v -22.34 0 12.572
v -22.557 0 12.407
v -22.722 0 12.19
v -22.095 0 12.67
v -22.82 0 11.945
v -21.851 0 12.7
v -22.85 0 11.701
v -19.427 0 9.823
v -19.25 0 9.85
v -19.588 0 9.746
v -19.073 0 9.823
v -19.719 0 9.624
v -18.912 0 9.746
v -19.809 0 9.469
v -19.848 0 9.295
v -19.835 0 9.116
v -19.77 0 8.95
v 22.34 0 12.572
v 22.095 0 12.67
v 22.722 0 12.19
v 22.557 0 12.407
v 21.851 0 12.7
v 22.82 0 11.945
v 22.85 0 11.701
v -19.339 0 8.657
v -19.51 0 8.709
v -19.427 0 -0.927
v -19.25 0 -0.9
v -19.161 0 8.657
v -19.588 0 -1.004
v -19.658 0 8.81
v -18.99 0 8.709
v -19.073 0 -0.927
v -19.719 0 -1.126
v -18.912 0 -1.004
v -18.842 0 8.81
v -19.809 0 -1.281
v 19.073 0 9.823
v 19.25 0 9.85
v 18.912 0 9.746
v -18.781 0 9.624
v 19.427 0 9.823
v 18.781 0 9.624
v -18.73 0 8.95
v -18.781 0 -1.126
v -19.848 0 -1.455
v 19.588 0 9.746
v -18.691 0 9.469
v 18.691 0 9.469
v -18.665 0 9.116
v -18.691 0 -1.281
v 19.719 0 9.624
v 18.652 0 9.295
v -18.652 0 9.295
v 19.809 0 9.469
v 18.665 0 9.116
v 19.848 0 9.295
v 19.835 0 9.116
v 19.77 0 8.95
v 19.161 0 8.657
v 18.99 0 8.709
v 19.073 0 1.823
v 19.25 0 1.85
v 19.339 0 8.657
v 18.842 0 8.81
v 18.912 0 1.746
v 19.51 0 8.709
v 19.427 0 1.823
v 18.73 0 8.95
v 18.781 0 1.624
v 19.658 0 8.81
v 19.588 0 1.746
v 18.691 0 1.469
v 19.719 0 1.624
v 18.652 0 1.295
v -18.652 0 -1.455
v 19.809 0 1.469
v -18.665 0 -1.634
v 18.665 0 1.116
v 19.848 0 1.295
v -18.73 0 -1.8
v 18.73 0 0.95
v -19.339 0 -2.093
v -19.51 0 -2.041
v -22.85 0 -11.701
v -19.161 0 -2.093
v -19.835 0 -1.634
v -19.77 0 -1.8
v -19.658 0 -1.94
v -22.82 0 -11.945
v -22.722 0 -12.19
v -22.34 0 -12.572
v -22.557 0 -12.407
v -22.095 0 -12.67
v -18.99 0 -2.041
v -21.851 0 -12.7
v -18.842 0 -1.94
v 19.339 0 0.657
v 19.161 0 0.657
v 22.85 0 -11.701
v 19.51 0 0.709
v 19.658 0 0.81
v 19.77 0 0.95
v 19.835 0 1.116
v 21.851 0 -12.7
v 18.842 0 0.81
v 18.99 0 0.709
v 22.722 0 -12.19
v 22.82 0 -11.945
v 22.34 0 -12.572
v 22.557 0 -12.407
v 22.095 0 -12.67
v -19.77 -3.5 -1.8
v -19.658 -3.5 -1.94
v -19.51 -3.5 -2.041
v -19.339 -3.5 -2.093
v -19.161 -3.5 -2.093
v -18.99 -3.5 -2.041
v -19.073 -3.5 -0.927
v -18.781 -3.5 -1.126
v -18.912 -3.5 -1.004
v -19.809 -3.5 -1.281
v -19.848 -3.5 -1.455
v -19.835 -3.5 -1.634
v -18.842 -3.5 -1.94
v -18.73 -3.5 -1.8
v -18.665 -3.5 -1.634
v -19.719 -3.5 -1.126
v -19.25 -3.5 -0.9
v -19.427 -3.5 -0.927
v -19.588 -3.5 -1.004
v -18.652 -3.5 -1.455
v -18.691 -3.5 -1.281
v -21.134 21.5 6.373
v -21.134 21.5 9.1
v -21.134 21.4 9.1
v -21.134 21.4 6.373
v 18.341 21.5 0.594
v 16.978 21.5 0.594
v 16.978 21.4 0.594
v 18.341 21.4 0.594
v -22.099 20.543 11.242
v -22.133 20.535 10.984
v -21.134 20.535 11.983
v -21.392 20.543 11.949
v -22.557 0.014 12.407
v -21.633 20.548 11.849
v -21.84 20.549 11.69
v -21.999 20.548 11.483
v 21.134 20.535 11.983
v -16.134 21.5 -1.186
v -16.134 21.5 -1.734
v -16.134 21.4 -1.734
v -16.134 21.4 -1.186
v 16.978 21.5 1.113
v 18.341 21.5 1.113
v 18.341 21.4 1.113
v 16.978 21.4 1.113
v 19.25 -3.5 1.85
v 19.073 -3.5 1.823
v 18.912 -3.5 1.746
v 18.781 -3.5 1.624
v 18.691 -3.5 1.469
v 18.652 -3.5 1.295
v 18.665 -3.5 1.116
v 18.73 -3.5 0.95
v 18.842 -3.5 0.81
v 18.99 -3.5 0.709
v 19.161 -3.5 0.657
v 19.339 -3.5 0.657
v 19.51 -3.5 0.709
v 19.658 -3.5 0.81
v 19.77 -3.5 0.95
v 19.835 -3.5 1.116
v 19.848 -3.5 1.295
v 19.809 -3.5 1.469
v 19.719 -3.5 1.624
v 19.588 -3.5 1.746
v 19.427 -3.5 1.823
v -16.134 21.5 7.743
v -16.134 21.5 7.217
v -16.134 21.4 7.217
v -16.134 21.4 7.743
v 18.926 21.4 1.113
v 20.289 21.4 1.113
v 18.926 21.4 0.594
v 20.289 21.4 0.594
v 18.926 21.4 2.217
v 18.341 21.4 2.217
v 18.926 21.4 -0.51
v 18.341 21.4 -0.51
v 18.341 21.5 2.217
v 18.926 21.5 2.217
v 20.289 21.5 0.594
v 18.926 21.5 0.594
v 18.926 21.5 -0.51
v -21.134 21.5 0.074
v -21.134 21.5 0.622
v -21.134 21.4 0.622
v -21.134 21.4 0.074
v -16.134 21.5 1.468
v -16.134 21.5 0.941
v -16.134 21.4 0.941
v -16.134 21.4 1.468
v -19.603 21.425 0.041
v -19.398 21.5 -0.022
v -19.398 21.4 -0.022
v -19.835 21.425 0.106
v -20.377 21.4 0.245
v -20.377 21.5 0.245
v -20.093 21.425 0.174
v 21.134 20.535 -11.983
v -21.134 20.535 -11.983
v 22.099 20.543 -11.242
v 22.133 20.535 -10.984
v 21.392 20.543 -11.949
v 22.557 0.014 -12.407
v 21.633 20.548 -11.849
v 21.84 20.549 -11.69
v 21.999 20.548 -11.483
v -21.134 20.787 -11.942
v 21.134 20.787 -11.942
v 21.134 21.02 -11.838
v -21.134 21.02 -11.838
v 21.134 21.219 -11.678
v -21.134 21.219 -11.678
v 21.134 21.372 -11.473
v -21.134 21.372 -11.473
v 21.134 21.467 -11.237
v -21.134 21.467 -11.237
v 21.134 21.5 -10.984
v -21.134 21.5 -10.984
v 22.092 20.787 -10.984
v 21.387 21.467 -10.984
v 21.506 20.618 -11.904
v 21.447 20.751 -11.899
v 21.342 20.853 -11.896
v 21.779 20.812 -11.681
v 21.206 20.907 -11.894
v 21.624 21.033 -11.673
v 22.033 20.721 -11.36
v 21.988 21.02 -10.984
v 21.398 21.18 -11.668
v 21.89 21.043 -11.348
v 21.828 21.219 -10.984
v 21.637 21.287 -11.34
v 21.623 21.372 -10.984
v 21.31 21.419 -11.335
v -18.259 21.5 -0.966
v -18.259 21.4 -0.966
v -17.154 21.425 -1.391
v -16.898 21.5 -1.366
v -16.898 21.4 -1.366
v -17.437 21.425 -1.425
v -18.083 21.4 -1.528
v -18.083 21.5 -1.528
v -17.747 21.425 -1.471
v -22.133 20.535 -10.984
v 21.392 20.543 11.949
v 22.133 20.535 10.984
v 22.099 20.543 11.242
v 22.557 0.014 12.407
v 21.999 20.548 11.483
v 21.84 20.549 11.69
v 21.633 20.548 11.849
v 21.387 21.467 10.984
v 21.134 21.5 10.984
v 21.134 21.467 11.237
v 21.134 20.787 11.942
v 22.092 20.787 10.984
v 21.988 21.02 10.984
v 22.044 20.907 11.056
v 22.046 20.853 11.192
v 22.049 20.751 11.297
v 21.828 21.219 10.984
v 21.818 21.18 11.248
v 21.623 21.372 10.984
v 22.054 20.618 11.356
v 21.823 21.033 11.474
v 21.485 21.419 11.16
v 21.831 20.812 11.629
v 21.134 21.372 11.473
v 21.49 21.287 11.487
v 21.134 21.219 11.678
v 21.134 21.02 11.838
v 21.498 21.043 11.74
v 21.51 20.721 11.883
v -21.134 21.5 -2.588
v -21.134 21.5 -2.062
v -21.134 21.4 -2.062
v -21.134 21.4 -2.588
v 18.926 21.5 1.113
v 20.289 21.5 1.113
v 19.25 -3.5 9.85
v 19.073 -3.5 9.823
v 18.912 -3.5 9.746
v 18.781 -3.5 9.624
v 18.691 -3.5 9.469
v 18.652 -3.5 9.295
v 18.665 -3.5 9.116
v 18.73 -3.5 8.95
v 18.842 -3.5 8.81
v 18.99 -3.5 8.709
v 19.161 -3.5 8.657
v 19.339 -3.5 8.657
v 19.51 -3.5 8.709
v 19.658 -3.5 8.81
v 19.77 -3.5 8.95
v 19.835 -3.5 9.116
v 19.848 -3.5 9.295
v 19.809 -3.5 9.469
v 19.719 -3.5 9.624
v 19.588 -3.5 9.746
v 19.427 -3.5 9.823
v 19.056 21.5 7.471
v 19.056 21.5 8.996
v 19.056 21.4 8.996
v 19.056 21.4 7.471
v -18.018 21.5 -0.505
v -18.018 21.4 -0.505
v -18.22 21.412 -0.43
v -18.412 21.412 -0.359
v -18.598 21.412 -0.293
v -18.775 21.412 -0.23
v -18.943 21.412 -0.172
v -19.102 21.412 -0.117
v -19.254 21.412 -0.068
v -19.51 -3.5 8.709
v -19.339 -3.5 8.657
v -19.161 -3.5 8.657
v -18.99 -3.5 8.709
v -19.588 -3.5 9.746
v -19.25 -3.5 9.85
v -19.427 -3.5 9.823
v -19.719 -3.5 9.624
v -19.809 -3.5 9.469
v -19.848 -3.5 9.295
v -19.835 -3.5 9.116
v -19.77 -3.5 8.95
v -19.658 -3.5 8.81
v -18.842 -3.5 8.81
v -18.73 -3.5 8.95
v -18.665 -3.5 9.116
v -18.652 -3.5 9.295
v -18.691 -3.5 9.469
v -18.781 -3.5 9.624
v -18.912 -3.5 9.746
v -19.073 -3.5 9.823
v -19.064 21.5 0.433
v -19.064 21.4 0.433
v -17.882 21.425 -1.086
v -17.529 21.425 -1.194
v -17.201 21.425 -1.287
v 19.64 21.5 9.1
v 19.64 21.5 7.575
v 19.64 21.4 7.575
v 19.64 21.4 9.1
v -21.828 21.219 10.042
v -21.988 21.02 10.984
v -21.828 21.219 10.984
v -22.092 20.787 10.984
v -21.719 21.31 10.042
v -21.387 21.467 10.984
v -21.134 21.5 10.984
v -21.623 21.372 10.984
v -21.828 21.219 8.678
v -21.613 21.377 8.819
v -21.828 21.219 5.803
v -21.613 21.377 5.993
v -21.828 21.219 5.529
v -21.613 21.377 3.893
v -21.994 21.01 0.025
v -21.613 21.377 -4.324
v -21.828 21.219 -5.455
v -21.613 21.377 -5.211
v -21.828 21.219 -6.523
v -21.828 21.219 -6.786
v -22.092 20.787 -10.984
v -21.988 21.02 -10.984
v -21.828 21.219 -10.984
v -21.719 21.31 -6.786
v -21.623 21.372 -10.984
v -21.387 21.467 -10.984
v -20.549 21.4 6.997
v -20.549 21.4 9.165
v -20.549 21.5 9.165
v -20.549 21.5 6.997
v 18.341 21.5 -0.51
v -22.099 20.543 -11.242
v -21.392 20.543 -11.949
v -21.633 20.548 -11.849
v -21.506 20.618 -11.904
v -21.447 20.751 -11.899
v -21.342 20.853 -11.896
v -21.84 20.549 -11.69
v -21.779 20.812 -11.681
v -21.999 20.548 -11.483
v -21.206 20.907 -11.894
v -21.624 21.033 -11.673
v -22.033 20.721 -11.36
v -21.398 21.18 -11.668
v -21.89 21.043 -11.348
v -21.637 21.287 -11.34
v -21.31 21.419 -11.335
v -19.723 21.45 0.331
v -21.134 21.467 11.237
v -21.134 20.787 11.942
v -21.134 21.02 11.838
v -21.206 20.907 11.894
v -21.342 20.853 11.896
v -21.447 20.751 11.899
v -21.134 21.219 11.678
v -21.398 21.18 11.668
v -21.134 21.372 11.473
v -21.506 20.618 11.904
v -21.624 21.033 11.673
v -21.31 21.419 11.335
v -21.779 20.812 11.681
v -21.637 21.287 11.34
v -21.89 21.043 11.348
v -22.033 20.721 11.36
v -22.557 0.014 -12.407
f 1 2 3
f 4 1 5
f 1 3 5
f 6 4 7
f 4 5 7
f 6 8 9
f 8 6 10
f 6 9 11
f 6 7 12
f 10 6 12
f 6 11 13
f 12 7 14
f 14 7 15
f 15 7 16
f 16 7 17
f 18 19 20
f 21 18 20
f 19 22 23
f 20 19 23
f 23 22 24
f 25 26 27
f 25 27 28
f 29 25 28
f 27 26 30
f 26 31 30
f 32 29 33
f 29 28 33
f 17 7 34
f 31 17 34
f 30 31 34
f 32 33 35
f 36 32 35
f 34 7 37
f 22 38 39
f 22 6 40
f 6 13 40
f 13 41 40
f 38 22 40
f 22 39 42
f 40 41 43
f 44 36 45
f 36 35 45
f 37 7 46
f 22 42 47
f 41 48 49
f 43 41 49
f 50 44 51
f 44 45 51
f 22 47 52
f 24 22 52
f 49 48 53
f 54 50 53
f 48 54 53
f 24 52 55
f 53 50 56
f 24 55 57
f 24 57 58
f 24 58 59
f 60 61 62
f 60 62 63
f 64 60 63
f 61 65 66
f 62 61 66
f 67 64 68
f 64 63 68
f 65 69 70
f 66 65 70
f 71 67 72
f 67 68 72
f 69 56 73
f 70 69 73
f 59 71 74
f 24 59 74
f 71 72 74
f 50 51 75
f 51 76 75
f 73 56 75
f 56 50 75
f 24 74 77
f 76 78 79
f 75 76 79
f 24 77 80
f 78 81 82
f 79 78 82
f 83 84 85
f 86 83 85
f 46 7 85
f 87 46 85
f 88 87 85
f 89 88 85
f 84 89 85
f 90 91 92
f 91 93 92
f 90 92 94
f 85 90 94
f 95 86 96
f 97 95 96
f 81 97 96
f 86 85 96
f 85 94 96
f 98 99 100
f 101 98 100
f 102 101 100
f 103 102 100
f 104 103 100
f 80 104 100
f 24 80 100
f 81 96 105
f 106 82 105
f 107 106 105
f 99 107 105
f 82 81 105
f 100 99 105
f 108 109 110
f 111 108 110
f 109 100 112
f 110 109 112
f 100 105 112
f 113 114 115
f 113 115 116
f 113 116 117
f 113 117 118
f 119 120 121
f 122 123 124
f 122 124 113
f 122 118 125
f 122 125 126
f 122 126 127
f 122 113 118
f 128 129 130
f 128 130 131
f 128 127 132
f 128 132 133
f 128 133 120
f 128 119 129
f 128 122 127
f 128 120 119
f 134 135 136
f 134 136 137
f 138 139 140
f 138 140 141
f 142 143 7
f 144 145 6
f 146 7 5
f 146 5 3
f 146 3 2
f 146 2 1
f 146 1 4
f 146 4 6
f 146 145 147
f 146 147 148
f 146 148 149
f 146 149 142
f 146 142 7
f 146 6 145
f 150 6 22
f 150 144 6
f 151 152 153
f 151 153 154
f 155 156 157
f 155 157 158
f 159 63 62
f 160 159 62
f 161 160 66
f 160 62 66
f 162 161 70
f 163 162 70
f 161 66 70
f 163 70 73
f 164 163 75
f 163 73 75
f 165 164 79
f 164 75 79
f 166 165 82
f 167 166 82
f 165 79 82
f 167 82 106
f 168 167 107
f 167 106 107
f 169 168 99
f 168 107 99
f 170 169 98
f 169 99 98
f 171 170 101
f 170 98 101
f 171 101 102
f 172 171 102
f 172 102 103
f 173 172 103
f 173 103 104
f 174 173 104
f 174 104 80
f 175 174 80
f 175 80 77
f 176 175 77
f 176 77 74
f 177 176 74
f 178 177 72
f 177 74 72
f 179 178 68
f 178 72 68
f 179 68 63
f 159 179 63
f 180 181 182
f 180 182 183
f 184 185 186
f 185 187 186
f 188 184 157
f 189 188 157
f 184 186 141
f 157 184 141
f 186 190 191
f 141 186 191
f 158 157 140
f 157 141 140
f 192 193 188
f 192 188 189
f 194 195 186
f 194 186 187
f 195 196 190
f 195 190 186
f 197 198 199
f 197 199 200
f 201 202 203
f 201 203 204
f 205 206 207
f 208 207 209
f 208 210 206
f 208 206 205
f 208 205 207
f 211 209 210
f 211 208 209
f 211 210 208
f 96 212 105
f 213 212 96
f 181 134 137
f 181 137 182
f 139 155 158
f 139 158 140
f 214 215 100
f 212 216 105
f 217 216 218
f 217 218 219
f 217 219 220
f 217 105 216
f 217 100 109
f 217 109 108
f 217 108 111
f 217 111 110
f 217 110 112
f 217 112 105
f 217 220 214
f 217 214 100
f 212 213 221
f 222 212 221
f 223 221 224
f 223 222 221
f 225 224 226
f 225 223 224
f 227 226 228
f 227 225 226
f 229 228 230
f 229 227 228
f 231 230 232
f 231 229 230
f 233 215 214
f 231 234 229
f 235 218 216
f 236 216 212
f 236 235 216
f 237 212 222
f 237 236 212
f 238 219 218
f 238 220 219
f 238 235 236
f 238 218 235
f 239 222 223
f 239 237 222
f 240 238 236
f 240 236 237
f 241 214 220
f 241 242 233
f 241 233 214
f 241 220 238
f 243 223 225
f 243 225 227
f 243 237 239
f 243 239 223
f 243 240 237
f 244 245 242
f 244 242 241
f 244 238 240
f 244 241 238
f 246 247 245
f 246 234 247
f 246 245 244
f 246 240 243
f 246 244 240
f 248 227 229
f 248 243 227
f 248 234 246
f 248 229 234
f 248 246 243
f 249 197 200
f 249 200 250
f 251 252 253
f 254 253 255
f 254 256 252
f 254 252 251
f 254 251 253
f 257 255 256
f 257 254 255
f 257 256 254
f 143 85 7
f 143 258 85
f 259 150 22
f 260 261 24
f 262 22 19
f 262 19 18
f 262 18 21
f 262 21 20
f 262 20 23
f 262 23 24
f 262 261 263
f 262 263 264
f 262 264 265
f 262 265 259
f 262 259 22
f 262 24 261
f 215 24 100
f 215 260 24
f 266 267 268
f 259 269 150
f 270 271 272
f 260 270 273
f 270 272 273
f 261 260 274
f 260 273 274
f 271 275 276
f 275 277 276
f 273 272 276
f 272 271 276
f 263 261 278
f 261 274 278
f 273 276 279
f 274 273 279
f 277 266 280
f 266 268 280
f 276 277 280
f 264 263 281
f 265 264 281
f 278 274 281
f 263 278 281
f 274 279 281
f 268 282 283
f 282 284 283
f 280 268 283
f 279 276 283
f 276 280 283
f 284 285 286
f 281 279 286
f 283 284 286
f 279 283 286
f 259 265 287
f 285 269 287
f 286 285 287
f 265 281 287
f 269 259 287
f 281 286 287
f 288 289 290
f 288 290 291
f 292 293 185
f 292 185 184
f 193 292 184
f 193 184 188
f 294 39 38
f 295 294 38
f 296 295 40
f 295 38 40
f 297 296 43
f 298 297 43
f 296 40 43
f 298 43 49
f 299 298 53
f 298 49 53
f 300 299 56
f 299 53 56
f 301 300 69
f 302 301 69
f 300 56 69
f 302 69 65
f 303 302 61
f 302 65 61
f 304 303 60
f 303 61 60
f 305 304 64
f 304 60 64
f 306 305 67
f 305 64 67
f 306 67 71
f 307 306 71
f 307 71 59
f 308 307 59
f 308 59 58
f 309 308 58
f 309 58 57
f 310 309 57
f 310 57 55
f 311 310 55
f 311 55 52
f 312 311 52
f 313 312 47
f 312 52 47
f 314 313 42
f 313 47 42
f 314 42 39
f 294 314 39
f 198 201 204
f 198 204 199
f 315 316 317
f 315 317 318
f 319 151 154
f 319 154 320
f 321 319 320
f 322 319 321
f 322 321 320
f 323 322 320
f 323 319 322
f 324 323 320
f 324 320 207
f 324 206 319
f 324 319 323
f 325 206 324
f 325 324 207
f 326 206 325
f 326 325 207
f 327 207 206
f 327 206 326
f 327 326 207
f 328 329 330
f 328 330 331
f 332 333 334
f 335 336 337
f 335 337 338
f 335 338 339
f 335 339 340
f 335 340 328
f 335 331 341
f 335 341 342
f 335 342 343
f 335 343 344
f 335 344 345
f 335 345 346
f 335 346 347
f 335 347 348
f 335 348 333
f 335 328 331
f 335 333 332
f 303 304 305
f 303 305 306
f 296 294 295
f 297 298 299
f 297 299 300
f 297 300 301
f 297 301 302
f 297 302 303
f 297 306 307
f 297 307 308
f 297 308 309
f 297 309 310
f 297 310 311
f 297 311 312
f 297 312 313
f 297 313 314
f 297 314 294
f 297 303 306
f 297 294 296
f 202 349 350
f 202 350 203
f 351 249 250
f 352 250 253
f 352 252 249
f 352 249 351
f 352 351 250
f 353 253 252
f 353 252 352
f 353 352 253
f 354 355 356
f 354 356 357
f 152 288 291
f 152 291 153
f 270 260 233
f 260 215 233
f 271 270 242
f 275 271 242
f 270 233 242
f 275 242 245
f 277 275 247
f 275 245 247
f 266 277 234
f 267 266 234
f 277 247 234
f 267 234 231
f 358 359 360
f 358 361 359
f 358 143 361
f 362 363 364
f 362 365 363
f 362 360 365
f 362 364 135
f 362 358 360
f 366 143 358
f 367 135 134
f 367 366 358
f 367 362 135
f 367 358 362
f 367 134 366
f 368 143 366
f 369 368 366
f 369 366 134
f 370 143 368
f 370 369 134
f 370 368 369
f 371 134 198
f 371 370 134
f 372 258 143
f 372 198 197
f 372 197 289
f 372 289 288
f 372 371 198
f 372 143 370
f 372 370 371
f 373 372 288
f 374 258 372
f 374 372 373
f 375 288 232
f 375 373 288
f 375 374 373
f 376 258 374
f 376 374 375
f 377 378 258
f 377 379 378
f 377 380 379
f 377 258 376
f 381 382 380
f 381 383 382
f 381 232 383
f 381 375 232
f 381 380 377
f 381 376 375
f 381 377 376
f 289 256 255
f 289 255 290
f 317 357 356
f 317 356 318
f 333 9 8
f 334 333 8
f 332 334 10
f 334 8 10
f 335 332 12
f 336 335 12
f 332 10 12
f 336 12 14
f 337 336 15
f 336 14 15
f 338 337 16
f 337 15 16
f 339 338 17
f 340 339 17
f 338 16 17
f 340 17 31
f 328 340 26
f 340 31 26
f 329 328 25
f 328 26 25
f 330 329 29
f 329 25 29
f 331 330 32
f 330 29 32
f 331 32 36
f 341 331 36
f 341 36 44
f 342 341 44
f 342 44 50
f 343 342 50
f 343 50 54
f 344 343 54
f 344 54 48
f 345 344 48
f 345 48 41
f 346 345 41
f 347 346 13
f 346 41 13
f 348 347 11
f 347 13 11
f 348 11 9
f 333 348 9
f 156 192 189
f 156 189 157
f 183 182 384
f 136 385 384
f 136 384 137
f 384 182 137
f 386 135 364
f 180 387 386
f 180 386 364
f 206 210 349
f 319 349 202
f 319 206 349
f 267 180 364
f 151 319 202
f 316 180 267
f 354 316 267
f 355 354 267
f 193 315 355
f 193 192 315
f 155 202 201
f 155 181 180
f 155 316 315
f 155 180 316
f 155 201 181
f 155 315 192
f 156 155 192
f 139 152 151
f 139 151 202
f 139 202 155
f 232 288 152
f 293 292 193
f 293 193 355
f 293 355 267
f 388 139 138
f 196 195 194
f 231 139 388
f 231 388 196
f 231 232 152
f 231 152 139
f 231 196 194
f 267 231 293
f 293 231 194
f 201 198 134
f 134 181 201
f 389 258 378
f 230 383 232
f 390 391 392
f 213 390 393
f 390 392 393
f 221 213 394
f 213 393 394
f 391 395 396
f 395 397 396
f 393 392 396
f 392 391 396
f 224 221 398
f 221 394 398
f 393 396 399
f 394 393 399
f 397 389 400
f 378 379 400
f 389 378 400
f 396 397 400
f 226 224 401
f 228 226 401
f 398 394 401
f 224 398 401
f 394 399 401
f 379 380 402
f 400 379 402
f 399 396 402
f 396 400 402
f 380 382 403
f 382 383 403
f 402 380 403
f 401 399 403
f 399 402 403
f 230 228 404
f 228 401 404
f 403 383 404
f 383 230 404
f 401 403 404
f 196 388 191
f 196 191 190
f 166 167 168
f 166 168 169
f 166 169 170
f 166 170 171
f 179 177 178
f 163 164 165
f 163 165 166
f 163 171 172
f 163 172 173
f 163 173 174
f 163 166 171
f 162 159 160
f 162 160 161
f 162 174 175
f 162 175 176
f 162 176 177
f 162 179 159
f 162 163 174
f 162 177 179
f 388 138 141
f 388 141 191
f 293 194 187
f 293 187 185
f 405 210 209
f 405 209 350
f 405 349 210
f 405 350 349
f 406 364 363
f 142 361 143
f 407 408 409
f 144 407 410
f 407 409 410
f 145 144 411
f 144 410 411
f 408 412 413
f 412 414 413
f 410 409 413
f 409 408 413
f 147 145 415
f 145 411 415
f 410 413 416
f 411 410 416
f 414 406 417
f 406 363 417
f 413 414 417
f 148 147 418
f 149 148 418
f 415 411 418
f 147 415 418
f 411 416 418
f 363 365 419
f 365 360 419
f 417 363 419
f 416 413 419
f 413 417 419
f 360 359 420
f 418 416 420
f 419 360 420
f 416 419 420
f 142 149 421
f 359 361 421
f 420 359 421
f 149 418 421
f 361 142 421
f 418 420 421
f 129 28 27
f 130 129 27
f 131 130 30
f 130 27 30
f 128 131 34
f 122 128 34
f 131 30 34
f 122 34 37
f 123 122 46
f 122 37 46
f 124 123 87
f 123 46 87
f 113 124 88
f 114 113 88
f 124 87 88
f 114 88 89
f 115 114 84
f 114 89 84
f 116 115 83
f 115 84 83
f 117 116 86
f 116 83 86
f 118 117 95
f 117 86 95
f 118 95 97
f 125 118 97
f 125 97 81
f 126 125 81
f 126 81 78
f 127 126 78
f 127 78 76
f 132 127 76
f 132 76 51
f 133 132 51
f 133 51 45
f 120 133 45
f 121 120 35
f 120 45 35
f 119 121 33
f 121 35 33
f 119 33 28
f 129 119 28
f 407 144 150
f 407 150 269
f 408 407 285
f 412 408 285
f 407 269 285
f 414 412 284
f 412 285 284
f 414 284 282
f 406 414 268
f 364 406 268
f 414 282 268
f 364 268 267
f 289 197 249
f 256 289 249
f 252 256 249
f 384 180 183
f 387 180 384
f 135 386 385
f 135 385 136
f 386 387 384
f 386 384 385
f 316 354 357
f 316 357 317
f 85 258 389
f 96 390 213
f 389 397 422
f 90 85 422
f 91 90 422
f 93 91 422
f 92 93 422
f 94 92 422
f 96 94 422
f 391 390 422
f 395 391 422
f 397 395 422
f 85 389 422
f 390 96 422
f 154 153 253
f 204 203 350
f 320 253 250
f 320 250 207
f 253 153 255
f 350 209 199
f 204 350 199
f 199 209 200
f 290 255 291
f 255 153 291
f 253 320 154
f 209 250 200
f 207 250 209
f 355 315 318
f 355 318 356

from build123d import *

# Parameters (mm, degrees)
SKETCH_1_W          = 45.7
SKETCH_1_H          = 25.4
EXTRUDE_1_DEPTH     = 21.5
EXTRUDE_1_TAPER     = 2
FILLET_1_R          = 1
SKETCH_2_R          = 0.6
EXTRUDE_2_DEPTH     = 3.5
CUT_EXTRUDE_1_DEPTH = 0.1


with BuildPart() as part:
    # Эскиз1 → Бобышка-Вытянуть1 (new body)
    with BuildSketch(Plane(origin=(0, 0, 0), x_dir=(1, 0, 0), z_dir=(0, 1, 0))):
        Rectangle(SKETCH_1_W, SKETCH_1_H)
    extrude(amount=EXTRUDE_1_DEPTH, taper=EXTRUDE_1_TAPER)

    # Скругление1
    fillet_1_edges = [part.edges().sort_by_distance(p)[0] for p in [
        (-22.099203456, 21.5, 0),
        (0, 21.5, 11.949203456),
        (22.099203456, 21.5, 0),
        (22.474601728, 10.75, 12.324601728),
        (-22.474601728, 10.75, 12.324601728),
        (-22.474601728, 10.75, -12.324601728),
        (22.474601728, 10.75, -12.324601728),
        (0, 21.5, -11.949203456),
    ]]
    fillet(fillet_1_edges, radius=FILLET_1_R)

    # Эскиз2 → Бобышка-Вытянуть2 (add)
    with BuildSketch(Plane.XZ):
        with Locations(Location((-19.25, 9.25, 0), (0, 0, 90))):
            Circle(SKETCH_2_R)
        with Locations(Location((19.25, 9.25, 0), (0, 0, 90))):
            Circle(SKETCH_2_R)
        with Locations(Location((19.25, 1.25, 0), (0, 0, 90))):
            Circle(SKETCH_2_R)
        with Locations(Location((-19.25, -1.5, 0), (0, 0, 90))):
            Circle(SKETCH_2_R)
    extrude(amount=EXTRUDE_2_DEPTH)

    # Эскиз3 → Вырез-Вытянуть1 (cut)
    with BuildSketch(Plane(origin=(0, 21.5, 0), x_dir=(1, 0, 0), z_dir=(0, 1, 0))):
        Polygon((19.640008188, -9.100397798), (19.055592603, -8.995892928), (19.055592603, -7.470933512), (19.640008188, -7.575438382), align=None)
        Polygon((20.289358837, -1.113384811), (18.925722473, -1.113384811), (18.925722473, -2.217280915), (18.341306889, -2.217280915), (18.341306889, -1.113384811), (16.977670525, -1.113384811), (16.977670525, -0.593904292), (18.341306889, -0.593904292), (18.341306889, 0.509991812), (18.925722473, 0.509991812), (18.925722473, -0.593904292), (20.289358837, -0.593904292), align=None)
        Polygon((-21.133514681, -6.373125071), (-16.133514681, -7.217280915), (-16.133514681, -7.742849097), (-20.549099097, -6.99711046), (-20.549099097, -9.165332863), (-21.133514681, -9.100397798), align=None)
        with BuildLine():
            Line((-21.133514681, 2.58791389), (-16.133514681, 1.733611942))
            Line((-16.133514681, 1.733611942), (-16.133514681, 1.185722332))
            Line((-16.133514681, 1.185722332), (-18.017646175, 0.50491876))
            add(Edge.make_bspline(
                [(-18.017646175, 0.50491876), (-18.084951638, 0.479901412), (-18.216446711, 0.431024873), (-18.409455405, 0.359102014), (-18.595117789, 0.294326278), (-18.771368832, 0.230303102), (-18.94005961, 0.173527591), (-19.099405054, 0.11756543), (-19.251272194, 0.068533592), (-19.349820298, 0.037152336), (-19.397516304, 0.021964215)],
                knots=[0, 0, 0, 0, 1.17864921, 2.302733803, 3.380832114, 4.40627524, 5.380631262, 6.302323787, 7.178346691, 8, 8, 8, 8], degree=3))
            add(Edge.make_bspline(
                [(-19.397516304, 0.021964215), (-19.466070769, 0.000654731), (-19.611110517, -0.044429456), (-19.843139107, -0.108631255), (-20.100830498, -0.176769053), (-20.281849123, -0.221474359), (-20.37661533, -0.244878317)],
                knots=[0, 0, 0, 0, 0.848709835, 1.795603867, 2.845962616, 4, 4, 4, 4], degree=3))
            add(Edge.make_bspline(
                [(-20.37661533, -0.244878317), (-20.158646903, -0.272468182), (-19.72000482, -0.327990331), (-19.28337221, -0.397574555), (-19.063709486, -0.43258124)],
                knots=[0, 0, 0, 0, 0.99383272, 2, 2, 2, 2], degree=3))
            Line((-19.063709486, -0.43258124), (-16.133514681, -0.940901045))
            Line((-16.133514681, -0.940901045), (-16.133514681, -1.468498447))
            Line((-16.133514681, -1.468498447), (-21.133514681, -0.622313382))
            Line((-21.133514681, -0.622313382), (-21.133514681, -0.074423772))
            Line((-21.133514681, -0.074423772), (-18.259123447, 0.965551877))
            add(Edge.make_bspline(
                [(-18.259123447, 0.965551877), (-18.13342725, 1.006165207), (-17.890654825, 1.084606694), (-17.5379298, 1.192033494), (-17.210066563, 1.286371648), (-16.998768155, 1.340422442), (-16.897516304, 1.366322981)],
                knots=[0, 0, 0, 0, 1.11654548, 2.156520707, 3.116625202, 4, 4, 4, 4], degree=3))
            add(Edge.make_bspline(
                [(-16.897516304, 1.366322981), (-16.98313031, 1.373970961), (-17.163429992, 1.390077303), (-17.446573636, 1.425294437), (-17.75612092, 1.470909488), (-17.970717493, 1.508204888), (-18.08258124, 1.527646033)],
                knots=[0, 0, 0, 0, 0.862057772, 1.815459291, 2.861254385, 4, 4, 4, 4], degree=3))
            Line((-18.08258124, 1.527646033), (-21.133514681, 2.062345708))
            Line((-21.133514681, 2.062345708), (-21.133514681, 2.58791389))
        make_face()
    extrude(amount=-CUT_EXTRUDE_1_DEPTH, mode=Mode.SUBTRACT)


solid = part.part
